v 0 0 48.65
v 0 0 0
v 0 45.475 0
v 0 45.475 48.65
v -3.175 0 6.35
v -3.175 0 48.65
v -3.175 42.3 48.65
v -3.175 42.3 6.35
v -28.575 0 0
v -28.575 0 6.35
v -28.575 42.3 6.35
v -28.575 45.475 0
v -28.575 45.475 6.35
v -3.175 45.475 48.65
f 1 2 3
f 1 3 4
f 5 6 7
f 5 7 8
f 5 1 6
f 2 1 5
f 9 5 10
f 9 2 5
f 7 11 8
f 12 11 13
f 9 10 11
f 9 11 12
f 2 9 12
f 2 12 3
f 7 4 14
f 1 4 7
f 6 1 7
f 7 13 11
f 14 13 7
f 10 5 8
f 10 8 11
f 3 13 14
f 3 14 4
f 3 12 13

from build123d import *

# Parameters (mm, degrees)
BOSS_EXTRUDE1_DEPTH = 45.475
BOSS_EXTRUDE2_DEPTH = 3.175


with BuildPart() as part:
    # Sketch1 → Boss-Extrude1 (new body)
    with BuildSketch(Plane(origin=(0, 0, 0), x_dir=(1, 0, 0), z_dir=(0, 1, 0))):
        Polygon((0, 0), (0, -48.65), (-3.175, -48.65), (-3.175, -6.35), (-28.575, -6.35), (-28.575, 0), align=None)
    extrude(amount=BOSS_EXTRUDE1_DEPTH)

    # Sketch2 → Boss-Extrude2 (add)
    with BuildSketch(Plane(origin=(0, 45.475, 0), x_dir=(1, 0, 0), z_dir=(0, 1, 0))):
        Polygon((-28.575, -6.35), (-3.175, -48.65), (-3.175, -6.35), align=None)
    extrude(amount=-BOSS_EXTRUDE2_DEPTH)


solid = part.part
